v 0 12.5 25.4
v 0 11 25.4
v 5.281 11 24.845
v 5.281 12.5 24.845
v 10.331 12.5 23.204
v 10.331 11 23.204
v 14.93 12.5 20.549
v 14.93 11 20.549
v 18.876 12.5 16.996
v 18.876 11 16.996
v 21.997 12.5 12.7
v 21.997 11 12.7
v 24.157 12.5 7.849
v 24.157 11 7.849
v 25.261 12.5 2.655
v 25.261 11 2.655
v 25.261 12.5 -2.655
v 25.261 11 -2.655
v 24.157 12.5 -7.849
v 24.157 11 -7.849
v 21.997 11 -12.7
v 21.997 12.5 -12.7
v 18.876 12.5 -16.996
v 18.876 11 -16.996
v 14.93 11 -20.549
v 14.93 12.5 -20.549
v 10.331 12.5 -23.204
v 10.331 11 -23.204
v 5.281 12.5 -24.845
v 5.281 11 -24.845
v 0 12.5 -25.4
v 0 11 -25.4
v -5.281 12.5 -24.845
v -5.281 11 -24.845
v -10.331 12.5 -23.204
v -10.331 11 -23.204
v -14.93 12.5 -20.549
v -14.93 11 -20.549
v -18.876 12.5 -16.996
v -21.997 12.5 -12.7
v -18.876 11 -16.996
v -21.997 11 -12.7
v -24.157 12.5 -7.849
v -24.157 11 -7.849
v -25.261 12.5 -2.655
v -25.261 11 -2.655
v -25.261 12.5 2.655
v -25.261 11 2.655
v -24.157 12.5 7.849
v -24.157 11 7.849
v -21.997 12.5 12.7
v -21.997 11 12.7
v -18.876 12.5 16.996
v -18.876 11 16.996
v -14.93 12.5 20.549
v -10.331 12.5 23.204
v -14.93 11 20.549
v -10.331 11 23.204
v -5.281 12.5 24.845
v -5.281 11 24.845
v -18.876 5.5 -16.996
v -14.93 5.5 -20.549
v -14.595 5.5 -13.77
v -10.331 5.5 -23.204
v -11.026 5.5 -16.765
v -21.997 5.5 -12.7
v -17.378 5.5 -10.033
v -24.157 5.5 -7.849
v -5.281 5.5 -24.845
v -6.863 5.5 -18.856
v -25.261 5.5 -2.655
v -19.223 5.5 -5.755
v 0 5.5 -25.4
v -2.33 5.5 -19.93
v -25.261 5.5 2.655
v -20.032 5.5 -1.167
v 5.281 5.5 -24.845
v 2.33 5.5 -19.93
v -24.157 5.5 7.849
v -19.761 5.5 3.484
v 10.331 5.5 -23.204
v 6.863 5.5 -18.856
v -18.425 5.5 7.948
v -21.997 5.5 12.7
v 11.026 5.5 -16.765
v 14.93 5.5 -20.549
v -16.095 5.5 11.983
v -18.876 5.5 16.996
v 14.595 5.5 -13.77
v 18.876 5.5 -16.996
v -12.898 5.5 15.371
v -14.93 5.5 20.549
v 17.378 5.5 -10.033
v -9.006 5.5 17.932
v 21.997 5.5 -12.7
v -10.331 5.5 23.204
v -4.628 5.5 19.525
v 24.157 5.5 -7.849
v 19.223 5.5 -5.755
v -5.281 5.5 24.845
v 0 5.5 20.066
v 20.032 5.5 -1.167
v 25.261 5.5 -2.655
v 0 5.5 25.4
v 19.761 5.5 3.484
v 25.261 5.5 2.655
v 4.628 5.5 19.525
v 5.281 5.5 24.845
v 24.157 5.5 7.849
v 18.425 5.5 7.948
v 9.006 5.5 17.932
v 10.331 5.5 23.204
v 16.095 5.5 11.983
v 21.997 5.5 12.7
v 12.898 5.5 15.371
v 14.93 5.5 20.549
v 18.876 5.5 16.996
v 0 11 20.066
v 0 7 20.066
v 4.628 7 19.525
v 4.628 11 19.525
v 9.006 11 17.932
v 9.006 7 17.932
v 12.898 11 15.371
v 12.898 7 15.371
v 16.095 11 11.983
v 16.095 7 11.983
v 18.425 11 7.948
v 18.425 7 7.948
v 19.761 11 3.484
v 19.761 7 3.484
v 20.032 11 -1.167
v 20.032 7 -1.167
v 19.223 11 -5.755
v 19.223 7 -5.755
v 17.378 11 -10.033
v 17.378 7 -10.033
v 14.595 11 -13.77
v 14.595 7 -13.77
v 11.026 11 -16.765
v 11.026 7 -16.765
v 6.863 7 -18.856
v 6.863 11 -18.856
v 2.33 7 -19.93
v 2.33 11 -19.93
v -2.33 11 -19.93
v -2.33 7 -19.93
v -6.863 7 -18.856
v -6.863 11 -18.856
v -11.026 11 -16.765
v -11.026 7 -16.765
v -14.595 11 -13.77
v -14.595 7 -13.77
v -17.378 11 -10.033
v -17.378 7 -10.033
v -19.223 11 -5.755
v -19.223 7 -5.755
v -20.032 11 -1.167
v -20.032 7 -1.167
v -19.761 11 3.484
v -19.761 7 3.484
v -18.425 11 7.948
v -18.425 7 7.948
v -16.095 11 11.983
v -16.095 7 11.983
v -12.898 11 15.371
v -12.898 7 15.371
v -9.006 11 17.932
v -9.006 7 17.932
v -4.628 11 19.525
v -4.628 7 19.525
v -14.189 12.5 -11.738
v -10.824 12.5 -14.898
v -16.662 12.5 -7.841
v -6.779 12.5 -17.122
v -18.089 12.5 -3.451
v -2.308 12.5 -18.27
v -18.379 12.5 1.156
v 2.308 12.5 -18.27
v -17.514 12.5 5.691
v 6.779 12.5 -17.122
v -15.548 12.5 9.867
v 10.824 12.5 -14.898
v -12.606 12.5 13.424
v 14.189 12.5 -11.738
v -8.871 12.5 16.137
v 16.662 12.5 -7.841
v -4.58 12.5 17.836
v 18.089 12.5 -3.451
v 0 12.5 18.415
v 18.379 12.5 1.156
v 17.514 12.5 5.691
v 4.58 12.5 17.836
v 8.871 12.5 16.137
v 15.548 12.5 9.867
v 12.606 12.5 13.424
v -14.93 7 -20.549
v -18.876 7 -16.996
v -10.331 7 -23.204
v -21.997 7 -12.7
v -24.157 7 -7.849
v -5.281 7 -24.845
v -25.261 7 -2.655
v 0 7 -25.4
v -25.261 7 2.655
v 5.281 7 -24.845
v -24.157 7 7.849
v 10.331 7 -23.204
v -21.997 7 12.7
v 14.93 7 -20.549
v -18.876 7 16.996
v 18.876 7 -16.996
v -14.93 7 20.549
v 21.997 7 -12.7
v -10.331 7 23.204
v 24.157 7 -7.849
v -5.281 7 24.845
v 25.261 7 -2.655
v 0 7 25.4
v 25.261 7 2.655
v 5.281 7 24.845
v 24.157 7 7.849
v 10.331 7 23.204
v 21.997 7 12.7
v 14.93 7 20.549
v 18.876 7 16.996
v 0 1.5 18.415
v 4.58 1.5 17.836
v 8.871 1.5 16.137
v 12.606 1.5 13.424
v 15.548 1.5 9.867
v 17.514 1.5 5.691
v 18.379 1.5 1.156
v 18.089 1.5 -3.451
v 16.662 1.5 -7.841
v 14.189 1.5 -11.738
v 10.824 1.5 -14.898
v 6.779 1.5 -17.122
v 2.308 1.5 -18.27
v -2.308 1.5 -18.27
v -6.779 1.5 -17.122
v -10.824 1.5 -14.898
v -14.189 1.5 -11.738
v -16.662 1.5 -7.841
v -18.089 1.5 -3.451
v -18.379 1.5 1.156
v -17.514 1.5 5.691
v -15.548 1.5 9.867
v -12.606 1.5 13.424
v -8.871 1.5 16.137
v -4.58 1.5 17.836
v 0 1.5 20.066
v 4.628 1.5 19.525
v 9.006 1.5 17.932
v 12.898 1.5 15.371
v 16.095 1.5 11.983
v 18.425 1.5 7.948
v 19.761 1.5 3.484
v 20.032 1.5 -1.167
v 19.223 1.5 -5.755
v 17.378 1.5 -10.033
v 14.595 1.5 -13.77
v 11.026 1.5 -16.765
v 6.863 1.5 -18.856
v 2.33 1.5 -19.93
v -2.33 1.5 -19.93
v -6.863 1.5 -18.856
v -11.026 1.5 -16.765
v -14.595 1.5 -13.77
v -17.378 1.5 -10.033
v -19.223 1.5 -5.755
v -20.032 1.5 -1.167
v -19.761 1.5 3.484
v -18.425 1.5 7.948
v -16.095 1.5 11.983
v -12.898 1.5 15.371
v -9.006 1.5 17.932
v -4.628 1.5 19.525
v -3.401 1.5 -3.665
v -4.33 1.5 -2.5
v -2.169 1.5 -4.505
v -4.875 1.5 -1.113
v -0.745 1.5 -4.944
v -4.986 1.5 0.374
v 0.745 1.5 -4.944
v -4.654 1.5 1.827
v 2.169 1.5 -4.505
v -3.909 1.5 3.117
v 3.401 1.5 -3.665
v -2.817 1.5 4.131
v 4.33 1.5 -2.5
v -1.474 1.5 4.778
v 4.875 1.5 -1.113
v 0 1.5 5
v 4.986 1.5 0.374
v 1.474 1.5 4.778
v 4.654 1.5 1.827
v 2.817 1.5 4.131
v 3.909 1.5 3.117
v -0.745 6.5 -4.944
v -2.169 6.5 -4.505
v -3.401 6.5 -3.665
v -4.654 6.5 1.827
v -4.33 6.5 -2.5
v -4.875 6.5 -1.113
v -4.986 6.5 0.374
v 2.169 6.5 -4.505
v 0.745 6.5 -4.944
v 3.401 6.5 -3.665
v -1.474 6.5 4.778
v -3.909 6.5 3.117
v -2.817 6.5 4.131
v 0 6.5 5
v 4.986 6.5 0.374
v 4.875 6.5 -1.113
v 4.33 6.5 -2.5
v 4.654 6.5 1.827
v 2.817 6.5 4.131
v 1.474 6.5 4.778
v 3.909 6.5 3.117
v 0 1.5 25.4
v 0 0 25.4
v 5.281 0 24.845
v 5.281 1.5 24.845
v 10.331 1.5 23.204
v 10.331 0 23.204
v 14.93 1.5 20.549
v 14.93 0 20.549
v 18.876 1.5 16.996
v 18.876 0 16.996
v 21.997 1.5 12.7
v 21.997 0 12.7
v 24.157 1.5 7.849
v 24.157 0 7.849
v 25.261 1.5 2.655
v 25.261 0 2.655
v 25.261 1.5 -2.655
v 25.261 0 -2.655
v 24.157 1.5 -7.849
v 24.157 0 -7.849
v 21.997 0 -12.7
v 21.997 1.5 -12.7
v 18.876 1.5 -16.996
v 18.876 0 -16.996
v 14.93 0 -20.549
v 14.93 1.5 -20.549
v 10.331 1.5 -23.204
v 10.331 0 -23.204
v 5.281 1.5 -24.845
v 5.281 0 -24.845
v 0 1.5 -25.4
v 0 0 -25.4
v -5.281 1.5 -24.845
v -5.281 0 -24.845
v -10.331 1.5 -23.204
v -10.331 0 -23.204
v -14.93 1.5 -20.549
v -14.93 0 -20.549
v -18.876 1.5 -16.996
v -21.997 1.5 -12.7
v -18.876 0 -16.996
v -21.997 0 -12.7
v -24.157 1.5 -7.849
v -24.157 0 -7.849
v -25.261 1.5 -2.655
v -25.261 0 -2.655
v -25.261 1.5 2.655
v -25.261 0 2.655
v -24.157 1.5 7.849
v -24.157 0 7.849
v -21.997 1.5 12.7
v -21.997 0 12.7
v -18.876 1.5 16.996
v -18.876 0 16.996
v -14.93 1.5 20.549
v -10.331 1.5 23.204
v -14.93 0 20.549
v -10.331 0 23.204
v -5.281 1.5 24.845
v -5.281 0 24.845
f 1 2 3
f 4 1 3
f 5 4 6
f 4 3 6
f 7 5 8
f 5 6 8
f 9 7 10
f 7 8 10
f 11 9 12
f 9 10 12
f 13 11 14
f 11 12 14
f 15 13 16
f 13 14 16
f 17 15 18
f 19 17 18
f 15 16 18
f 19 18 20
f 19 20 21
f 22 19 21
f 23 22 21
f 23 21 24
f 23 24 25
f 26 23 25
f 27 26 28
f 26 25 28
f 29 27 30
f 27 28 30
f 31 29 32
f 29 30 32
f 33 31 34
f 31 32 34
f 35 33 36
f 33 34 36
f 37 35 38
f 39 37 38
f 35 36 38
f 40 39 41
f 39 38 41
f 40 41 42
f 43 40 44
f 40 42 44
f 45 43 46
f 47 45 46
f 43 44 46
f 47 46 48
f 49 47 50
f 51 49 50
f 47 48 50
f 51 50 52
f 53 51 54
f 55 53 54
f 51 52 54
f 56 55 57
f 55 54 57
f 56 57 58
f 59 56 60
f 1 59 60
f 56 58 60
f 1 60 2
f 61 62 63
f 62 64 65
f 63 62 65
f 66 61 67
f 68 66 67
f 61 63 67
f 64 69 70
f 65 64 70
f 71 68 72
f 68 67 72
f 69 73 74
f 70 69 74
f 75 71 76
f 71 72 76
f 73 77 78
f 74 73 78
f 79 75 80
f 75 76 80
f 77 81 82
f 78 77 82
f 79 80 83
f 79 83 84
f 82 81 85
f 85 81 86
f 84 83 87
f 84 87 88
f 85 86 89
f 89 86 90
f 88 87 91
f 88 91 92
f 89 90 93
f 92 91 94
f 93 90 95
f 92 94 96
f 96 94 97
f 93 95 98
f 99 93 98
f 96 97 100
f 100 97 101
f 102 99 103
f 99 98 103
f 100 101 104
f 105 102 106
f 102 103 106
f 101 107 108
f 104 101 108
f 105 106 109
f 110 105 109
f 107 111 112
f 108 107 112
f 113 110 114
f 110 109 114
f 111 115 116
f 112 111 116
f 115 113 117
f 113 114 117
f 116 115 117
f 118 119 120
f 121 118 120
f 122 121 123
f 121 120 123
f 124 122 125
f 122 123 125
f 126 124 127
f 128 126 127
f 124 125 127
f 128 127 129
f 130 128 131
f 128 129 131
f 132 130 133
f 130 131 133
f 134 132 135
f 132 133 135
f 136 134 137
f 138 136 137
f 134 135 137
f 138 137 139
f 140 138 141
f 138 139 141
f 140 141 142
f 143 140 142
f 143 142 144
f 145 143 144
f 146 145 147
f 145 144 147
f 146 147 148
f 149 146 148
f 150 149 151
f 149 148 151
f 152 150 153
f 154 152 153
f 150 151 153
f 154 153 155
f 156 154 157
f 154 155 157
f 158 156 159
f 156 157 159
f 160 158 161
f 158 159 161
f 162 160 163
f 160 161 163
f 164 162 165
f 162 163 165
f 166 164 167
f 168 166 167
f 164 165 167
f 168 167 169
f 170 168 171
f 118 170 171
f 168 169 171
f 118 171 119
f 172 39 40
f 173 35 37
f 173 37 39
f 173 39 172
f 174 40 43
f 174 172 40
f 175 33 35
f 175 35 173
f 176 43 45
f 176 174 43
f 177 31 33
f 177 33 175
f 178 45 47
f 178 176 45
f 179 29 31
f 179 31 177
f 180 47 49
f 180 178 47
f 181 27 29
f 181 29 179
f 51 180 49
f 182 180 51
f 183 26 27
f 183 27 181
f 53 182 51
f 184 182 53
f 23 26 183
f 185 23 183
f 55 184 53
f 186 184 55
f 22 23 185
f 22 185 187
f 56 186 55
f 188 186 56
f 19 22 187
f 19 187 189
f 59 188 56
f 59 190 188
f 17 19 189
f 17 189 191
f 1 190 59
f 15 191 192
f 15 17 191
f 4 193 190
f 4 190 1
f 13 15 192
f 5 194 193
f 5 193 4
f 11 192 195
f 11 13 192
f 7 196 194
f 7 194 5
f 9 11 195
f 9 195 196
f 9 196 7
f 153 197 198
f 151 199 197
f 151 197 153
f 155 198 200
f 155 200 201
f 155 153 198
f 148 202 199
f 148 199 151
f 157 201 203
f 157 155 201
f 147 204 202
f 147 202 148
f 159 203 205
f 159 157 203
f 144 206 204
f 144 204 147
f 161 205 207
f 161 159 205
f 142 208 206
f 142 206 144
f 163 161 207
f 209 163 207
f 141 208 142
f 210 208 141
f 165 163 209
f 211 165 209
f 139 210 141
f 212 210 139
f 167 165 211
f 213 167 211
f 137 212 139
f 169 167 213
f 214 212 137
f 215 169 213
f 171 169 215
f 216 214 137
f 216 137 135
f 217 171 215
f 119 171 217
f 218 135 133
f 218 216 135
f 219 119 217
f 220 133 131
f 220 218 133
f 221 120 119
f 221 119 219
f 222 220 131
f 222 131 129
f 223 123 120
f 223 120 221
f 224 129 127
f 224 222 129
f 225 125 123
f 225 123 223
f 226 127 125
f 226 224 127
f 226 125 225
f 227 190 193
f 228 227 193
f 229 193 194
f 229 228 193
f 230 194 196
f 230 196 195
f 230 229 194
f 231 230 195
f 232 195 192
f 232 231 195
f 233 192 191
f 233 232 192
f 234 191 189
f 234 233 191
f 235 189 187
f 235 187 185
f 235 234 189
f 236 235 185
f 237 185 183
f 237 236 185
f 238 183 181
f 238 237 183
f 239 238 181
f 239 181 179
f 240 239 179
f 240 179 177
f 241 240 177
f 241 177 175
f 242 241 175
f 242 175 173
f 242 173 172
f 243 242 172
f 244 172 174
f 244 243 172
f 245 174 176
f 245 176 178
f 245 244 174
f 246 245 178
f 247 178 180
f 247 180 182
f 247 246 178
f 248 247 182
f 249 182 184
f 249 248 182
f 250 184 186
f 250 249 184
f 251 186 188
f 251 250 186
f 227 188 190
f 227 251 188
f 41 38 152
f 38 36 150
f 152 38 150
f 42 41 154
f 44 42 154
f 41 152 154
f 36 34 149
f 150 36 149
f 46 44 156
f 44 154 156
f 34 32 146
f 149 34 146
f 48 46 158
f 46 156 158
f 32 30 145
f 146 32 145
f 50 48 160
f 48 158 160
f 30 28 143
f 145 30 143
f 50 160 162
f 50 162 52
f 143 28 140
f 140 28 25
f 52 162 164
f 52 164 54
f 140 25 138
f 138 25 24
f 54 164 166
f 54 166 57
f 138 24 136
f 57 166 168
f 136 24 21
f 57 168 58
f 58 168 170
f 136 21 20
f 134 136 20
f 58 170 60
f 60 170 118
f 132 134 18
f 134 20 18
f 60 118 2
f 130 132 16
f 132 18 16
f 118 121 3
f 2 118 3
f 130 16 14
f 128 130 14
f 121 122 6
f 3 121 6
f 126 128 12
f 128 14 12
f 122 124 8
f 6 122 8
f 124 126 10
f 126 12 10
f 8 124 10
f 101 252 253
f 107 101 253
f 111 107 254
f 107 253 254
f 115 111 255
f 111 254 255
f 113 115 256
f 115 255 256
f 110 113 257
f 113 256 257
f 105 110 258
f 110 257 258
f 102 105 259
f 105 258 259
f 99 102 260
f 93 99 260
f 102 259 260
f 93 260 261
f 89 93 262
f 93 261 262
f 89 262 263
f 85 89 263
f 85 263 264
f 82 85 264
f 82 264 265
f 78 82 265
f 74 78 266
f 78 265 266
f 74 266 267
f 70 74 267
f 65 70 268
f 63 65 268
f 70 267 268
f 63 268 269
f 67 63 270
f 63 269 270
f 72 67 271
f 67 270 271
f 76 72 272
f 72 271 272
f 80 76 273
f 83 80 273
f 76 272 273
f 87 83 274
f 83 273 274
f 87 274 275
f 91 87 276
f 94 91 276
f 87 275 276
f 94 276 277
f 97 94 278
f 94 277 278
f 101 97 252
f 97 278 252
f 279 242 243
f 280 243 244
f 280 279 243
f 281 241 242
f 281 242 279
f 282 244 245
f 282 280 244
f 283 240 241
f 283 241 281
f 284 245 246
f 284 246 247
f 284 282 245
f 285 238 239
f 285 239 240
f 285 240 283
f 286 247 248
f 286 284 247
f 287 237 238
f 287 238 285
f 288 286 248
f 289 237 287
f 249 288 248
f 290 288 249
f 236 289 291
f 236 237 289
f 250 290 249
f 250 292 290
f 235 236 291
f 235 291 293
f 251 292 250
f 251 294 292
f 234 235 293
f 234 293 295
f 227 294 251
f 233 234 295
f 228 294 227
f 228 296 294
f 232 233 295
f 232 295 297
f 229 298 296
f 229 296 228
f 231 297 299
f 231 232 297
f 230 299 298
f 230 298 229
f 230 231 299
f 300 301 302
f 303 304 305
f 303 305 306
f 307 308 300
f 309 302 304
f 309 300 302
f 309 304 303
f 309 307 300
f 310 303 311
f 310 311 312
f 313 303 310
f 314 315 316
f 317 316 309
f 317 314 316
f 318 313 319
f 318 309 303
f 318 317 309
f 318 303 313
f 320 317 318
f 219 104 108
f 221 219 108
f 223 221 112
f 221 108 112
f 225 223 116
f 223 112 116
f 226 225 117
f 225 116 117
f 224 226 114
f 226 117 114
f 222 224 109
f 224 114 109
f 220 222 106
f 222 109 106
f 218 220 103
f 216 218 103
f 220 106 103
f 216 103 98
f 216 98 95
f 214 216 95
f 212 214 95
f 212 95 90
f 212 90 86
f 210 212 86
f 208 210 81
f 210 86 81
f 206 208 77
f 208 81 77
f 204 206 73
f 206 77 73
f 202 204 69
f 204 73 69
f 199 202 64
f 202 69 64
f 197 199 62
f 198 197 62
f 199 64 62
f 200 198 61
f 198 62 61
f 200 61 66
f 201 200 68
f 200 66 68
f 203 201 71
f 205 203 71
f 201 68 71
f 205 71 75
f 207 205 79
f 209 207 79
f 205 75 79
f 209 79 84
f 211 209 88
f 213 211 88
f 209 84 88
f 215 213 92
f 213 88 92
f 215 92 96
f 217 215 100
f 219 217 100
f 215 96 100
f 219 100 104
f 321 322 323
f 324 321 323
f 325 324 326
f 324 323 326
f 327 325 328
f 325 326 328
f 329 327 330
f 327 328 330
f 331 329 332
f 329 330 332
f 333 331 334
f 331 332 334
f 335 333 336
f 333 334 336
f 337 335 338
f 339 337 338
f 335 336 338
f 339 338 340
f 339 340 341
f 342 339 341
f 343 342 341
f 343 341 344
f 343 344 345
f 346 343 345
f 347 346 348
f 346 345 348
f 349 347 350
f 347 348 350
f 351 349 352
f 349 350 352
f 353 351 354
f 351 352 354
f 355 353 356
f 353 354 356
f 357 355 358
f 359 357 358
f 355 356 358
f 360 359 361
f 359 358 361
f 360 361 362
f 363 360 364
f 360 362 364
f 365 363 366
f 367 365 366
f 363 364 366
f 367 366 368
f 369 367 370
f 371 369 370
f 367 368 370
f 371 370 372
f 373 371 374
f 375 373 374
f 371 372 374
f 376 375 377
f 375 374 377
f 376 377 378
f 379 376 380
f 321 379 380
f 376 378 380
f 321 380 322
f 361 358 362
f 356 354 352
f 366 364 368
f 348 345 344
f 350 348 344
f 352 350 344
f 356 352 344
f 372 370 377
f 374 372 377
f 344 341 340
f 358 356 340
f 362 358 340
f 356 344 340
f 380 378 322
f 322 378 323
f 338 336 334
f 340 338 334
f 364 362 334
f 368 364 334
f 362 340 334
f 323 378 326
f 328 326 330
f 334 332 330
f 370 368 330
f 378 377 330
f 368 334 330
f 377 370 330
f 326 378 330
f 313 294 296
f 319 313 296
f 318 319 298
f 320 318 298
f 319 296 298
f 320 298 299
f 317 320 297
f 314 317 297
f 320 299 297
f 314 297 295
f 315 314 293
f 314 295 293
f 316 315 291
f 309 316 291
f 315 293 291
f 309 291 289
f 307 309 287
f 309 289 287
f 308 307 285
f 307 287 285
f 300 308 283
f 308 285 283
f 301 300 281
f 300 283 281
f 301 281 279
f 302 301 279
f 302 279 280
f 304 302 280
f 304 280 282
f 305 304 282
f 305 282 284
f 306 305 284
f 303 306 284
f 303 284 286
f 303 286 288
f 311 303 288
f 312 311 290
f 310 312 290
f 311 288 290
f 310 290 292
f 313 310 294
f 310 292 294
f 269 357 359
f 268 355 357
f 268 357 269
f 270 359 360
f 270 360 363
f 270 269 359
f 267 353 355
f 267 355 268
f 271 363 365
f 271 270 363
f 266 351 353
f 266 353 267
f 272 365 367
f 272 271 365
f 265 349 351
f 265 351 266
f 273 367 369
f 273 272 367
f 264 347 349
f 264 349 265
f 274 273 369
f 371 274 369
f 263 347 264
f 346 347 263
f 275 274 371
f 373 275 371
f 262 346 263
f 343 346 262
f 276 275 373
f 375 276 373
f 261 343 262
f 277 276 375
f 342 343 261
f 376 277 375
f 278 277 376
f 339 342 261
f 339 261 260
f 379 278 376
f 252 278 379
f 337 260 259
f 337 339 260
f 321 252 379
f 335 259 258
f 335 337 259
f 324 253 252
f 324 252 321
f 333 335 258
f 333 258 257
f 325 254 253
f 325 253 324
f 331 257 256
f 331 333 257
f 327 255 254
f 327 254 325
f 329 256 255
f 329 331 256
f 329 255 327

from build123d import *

# Parameters (mm, degrees)
SKETCH1_R           = 25.4
BOSS_EXTRUDE1_DEPTH = 1.5
BOSS_EXTRUDE2_START = 1.5
SKETCH1_3_R         = 20.066
SKETCH1_3_R_2       = 18.415
BOSS_EXTRUDE2_DEPTH = 4
BOSS_EXTRUDE3_START = 5.5
SKETCH1_4_R         = 25.4
SKETCH1_4_R_2       = 20.066
SKETCH1_4_R_3       = 18.415
BOSS_EXTRUDE3_DEPTH = 1.5
BOSS_EXTRUDE4_START = 7
SKETCH1_5_R         = 20.066
SKETCH1_5_R_2       = 18.415
BOSS_EXTRUDE4_DEPTH = 4
BOSS_EXTRUDE5_START = 11
SKETCH1_6_R         = 25.4
SKETCH1_6_R_2       = 20.066
SKETCH1_6_R_3       = 18.415
BOSS_EXTRUDE5_DEPTH = 1.5
BOSS_EXTRUDE6_START = 1.5
SKETCH1_7_R         = 5
BOSS_EXTRUDE6_DEPTH = 5


with BuildPart() as part:
    # Sketch1 → Boss-Extrude1 (new body)
    with BuildSketch(Plane(origin=(0, 0, 0), x_dir=(1, 0, 0), z_dir=(0, 1, 0))):
        with Locations(Location((0, 0, 0), (0, 0, 270))):
            Circle(SKETCH1_R)
    extrude(amount=BOSS_EXTRUDE1_DEPTH)

    # Sketch1<3> → Boss-Extrude2 (add)
    with BuildSketch(Plane(origin=(0, 0, 0), x_dir=(1, 0, 0), z_dir=(0, 1, 0)).offset(BOSS_EXTRUDE2_START)):
        with Locations(Location((0, 0, 0), (0, 0, 270))):
            Circle(SKETCH1_3_R)
        with Locations(Location((0, 0, 0), (0, 0, 270))):
            Circle(SKETCH1_3_R_2, mode=Mode.SUBTRACT)
    extrude(amount=BOSS_EXTRUDE2_DEPTH)

    # Sketch1<4> → Boss-Extrude3 (add)
    # profile 1 of 2: a face of its own
    with BuildSketch(Plane(origin=(0, 0, 0), x_dir=(1, 0, 0), z_dir=(0, 1, 0)).offset(BOSS_EXTRUDE3_START)):
        with Locations(Location((0, 0, 0), (0, 0, 270))):
            Circle(SKETCH1_4_R)
        with Locations(Location((0, 0, 0), (0, 0, 270))):
            Circle(SKETCH1_4_R_2, mode=Mode.SUBTRACT)
    # profile 2 of 2: a face of its own
    with BuildSketch(Plane(origin=(0, 0, 0), x_dir=(1, 0, 0), z_dir=(0, 1, 0)).offset(BOSS_EXTRUDE3_START)):
        with Locations(Location((0, 0, 0), (0, 0, 270))):
            Circle(SKETCH1_4_R_2)
        with Locations(Location((0, 0, 0), (0, 0, 270))):
            Circle(SKETCH1_4_R_3, mode=Mode.SUBTRACT)
    extrude(amount=BOSS_EXTRUDE3_DEPTH)

    # Sketch1<5> → Boss-Extrude4 (add)
    with BuildSketch(Plane(origin=(0, 0, 0), x_dir=(1, 0, 0), z_dir=(0, 1, 0)).offset(BOSS_EXTRUDE4_START)):
        with Locations(Location((0, 0, 0), (0, 0, 270))):
            Circle(SKETCH1_5_R)
        with Locations(Location((0, 0, 0), (0, 0, 270))):
            Circle(SKETCH1_5_R_2, mode=Mode.SUBTRACT)
    extrude(amount=BOSS_EXTRUDE4_DEPTH)

    # Sketch1<6> → Boss-Extrude5 (add)
    # profile 1 of 2: a face of its own
    with BuildSketch(Plane(origin=(0, 0, 0), x_dir=(1, 0, 0), z_dir=(0, 1, 0)).offset(BOSS_EXTRUDE5_START)):
        with Locations(Location((0, 0, 0), (0, 0, 270))):
            Circle(SKETCH1_6_R)
        with Locations(Location((0, 0, 0), (0, 0, 270))):
            Circle(SKETCH1_6_R_2, mode=Mode.SUBTRACT)
    # profile 2 of 2: a face of its own
    with BuildSketch(Plane(origin=(0, 0, 0), x_dir=(1, 0, 0), z_dir=(0, 1, 0)).offset(BOSS_EXTRUDE5_START)):
        with Locations(Location((0, 0, 0), (0, 0, 270))):
            Circle(SKETCH1_6_R_2)
        with Locations(Location((0, 0, 0), (0, 0, 270))):
            Circle(SKETCH1_6_R_3, mode=Mode.SUBTRACT)
    extrude(amount=BOSS_EXTRUDE5_DEPTH)

    # Sketch1<7> → Boss-Extrude6 (add)
    with BuildSketch(Plane(origin=(0, 0, 0), x_dir=(1, 0, 0), z_dir=(0, 1, 0)).offset(BOSS_EXTRUDE6_START)):
        with Locations(Location((0, 0, 0), (0, 0, 270))):
            Circle(SKETCH1_7_R)
    extrude(amount=BOSS_EXTRUDE6_DEPTH)


solid = part.part
